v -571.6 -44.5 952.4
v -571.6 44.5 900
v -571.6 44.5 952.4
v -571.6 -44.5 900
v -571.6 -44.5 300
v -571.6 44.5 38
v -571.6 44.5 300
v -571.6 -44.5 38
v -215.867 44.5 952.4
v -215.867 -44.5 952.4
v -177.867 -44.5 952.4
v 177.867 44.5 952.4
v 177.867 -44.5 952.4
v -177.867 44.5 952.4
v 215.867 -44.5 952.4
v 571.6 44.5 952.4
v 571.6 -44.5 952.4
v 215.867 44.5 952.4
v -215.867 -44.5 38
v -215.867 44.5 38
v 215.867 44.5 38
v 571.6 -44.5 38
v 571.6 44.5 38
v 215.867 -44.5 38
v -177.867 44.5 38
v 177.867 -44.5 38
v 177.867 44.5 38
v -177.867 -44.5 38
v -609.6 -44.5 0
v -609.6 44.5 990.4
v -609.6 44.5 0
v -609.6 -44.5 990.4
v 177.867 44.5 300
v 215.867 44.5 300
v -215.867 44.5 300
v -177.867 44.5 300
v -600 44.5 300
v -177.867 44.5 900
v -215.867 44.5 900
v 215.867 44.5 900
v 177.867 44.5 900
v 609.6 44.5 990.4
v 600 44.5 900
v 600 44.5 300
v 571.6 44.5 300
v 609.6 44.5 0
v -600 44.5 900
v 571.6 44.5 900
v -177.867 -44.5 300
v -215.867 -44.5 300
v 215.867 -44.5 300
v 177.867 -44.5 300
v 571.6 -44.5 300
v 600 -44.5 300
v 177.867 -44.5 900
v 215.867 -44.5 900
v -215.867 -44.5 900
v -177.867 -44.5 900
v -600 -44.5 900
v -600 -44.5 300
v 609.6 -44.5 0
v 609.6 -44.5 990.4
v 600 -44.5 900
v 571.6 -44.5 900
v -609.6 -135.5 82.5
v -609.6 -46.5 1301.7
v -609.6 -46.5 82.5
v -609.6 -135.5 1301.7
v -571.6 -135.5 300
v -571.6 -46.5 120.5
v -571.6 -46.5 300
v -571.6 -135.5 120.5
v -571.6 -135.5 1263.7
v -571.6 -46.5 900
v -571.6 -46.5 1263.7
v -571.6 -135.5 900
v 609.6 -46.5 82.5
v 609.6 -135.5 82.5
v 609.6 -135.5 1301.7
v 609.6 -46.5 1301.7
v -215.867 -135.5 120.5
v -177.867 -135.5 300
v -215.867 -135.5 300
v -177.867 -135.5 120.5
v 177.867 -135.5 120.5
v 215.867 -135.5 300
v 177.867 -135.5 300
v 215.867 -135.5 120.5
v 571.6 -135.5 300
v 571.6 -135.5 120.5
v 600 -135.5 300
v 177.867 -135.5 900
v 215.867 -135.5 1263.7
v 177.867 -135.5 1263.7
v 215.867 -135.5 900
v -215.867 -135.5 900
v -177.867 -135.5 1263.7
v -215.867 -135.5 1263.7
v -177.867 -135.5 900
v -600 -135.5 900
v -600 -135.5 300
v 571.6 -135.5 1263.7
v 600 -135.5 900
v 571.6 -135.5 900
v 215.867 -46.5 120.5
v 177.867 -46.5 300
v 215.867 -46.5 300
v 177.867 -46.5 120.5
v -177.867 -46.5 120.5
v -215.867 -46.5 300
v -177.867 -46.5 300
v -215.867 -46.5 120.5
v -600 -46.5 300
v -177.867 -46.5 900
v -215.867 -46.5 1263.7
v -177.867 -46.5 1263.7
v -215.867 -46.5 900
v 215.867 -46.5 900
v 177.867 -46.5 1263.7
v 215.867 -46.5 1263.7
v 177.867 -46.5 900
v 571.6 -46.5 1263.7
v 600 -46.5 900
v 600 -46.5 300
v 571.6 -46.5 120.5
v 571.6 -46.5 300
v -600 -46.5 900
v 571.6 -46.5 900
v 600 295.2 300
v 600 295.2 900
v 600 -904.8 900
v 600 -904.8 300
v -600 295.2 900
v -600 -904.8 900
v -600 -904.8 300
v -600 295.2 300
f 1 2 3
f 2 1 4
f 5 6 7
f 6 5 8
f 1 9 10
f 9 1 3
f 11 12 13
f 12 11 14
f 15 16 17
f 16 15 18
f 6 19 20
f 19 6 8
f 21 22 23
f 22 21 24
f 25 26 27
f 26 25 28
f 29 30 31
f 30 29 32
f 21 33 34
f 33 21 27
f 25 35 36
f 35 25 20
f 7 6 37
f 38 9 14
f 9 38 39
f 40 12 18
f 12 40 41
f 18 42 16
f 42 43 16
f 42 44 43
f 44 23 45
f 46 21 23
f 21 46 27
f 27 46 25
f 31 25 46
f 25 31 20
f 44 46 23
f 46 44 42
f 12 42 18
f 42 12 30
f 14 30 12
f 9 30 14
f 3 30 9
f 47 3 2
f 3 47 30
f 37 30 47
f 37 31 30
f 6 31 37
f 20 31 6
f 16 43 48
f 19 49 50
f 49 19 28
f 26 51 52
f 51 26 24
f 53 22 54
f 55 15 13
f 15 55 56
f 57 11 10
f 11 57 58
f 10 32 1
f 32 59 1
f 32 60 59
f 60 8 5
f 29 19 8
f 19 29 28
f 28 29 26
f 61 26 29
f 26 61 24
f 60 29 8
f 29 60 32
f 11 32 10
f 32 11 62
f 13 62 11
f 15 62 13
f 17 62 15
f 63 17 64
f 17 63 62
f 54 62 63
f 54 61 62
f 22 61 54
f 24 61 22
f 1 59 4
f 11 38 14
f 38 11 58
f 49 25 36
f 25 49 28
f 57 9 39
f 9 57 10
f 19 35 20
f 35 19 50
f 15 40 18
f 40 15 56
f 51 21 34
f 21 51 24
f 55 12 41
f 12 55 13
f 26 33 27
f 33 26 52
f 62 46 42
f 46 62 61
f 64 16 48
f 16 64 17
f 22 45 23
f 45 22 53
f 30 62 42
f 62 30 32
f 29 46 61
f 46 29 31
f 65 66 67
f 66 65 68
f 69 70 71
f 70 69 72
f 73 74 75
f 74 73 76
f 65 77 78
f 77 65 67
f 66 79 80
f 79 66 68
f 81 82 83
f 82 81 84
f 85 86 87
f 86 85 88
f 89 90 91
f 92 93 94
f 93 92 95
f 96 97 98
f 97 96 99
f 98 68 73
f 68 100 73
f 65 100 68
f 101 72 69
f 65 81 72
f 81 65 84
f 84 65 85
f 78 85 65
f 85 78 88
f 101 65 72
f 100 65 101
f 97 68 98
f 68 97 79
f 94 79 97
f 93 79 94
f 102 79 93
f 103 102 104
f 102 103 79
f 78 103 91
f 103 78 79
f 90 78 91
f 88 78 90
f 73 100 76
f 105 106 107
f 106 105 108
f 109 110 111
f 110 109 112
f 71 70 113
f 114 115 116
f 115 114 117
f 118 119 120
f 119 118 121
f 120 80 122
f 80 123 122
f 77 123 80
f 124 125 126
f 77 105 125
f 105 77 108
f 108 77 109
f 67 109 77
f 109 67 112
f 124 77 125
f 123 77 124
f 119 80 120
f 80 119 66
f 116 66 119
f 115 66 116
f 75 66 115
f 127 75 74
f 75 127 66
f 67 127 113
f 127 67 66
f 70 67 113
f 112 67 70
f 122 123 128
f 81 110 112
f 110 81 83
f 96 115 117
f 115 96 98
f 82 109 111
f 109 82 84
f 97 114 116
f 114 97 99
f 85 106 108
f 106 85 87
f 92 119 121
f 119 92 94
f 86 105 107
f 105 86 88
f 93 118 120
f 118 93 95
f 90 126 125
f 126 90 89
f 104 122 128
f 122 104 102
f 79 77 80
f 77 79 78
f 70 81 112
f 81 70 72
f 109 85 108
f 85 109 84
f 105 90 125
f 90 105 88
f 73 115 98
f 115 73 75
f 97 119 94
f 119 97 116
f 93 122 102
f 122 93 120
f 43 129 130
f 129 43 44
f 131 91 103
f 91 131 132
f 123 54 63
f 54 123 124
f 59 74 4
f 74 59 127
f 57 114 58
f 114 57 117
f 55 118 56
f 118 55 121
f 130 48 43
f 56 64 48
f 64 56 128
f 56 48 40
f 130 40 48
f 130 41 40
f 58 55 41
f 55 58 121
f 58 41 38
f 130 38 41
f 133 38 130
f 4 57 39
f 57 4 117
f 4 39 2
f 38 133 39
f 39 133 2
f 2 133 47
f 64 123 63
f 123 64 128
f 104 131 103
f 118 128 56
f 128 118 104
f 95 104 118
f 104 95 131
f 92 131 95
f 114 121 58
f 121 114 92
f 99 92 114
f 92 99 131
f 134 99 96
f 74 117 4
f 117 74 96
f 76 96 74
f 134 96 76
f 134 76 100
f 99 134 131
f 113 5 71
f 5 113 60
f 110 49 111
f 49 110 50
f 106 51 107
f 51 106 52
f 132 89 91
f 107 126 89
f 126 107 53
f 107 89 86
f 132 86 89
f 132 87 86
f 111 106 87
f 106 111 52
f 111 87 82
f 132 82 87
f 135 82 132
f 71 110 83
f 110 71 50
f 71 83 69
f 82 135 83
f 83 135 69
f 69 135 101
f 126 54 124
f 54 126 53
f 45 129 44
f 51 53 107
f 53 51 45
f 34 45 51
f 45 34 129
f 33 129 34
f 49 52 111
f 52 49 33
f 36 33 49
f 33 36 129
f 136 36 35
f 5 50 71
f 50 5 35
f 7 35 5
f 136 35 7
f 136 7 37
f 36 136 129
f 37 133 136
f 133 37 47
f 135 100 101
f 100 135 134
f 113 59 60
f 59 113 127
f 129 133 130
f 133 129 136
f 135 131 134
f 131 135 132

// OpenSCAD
internal_width=1200;
internal_length=1200;
internal_height=600;

//2x4=38x89

base();
translate([0, -12*25.4, 600]) #cube([internal_width, internal_length, internal_height], center=true);
translate([0, -44.5-2, 44.5+914.4+38]) rotate([90,0,0])translate([0, -12*25.4, 0]) {
    platform();
    %translate([0, 0, 89+internal_height/2]) 
    cube([internal_width, internal_length, internal_height], center=true);
}
module base(){
    translate([0, 0, 38+914.4+19]) rotate([0,90,0]) 2by4(1219.2);
    translate([0, 0, 38]) for(X=[-2, -2/3, 2/3, 2]) 
        translate([(304.8-9.5)*X, 0, 457.2]) 2by4(914.4);
    translate([0, 0, 19]) rotate([0,90,0]) 2by4(1219.2);
}

module platform(){
    translate([0, 0, 44.5]) for(X=[-1, -1/3, 1/3, 1])
    translate([(609.6-19)*X, 0, 0]) rotate([90,0,0]) 2by4(1219.2);
    
    translate([0, 0, 44.5]) for(Y=[-1, 1])
    translate([0, (609.6-19)*Y, 0]) rotate([90,0,90]) 2by4(1219.2);
}

module 2by4(length=1000){
    cube([38, 89, length], center=true);
}
